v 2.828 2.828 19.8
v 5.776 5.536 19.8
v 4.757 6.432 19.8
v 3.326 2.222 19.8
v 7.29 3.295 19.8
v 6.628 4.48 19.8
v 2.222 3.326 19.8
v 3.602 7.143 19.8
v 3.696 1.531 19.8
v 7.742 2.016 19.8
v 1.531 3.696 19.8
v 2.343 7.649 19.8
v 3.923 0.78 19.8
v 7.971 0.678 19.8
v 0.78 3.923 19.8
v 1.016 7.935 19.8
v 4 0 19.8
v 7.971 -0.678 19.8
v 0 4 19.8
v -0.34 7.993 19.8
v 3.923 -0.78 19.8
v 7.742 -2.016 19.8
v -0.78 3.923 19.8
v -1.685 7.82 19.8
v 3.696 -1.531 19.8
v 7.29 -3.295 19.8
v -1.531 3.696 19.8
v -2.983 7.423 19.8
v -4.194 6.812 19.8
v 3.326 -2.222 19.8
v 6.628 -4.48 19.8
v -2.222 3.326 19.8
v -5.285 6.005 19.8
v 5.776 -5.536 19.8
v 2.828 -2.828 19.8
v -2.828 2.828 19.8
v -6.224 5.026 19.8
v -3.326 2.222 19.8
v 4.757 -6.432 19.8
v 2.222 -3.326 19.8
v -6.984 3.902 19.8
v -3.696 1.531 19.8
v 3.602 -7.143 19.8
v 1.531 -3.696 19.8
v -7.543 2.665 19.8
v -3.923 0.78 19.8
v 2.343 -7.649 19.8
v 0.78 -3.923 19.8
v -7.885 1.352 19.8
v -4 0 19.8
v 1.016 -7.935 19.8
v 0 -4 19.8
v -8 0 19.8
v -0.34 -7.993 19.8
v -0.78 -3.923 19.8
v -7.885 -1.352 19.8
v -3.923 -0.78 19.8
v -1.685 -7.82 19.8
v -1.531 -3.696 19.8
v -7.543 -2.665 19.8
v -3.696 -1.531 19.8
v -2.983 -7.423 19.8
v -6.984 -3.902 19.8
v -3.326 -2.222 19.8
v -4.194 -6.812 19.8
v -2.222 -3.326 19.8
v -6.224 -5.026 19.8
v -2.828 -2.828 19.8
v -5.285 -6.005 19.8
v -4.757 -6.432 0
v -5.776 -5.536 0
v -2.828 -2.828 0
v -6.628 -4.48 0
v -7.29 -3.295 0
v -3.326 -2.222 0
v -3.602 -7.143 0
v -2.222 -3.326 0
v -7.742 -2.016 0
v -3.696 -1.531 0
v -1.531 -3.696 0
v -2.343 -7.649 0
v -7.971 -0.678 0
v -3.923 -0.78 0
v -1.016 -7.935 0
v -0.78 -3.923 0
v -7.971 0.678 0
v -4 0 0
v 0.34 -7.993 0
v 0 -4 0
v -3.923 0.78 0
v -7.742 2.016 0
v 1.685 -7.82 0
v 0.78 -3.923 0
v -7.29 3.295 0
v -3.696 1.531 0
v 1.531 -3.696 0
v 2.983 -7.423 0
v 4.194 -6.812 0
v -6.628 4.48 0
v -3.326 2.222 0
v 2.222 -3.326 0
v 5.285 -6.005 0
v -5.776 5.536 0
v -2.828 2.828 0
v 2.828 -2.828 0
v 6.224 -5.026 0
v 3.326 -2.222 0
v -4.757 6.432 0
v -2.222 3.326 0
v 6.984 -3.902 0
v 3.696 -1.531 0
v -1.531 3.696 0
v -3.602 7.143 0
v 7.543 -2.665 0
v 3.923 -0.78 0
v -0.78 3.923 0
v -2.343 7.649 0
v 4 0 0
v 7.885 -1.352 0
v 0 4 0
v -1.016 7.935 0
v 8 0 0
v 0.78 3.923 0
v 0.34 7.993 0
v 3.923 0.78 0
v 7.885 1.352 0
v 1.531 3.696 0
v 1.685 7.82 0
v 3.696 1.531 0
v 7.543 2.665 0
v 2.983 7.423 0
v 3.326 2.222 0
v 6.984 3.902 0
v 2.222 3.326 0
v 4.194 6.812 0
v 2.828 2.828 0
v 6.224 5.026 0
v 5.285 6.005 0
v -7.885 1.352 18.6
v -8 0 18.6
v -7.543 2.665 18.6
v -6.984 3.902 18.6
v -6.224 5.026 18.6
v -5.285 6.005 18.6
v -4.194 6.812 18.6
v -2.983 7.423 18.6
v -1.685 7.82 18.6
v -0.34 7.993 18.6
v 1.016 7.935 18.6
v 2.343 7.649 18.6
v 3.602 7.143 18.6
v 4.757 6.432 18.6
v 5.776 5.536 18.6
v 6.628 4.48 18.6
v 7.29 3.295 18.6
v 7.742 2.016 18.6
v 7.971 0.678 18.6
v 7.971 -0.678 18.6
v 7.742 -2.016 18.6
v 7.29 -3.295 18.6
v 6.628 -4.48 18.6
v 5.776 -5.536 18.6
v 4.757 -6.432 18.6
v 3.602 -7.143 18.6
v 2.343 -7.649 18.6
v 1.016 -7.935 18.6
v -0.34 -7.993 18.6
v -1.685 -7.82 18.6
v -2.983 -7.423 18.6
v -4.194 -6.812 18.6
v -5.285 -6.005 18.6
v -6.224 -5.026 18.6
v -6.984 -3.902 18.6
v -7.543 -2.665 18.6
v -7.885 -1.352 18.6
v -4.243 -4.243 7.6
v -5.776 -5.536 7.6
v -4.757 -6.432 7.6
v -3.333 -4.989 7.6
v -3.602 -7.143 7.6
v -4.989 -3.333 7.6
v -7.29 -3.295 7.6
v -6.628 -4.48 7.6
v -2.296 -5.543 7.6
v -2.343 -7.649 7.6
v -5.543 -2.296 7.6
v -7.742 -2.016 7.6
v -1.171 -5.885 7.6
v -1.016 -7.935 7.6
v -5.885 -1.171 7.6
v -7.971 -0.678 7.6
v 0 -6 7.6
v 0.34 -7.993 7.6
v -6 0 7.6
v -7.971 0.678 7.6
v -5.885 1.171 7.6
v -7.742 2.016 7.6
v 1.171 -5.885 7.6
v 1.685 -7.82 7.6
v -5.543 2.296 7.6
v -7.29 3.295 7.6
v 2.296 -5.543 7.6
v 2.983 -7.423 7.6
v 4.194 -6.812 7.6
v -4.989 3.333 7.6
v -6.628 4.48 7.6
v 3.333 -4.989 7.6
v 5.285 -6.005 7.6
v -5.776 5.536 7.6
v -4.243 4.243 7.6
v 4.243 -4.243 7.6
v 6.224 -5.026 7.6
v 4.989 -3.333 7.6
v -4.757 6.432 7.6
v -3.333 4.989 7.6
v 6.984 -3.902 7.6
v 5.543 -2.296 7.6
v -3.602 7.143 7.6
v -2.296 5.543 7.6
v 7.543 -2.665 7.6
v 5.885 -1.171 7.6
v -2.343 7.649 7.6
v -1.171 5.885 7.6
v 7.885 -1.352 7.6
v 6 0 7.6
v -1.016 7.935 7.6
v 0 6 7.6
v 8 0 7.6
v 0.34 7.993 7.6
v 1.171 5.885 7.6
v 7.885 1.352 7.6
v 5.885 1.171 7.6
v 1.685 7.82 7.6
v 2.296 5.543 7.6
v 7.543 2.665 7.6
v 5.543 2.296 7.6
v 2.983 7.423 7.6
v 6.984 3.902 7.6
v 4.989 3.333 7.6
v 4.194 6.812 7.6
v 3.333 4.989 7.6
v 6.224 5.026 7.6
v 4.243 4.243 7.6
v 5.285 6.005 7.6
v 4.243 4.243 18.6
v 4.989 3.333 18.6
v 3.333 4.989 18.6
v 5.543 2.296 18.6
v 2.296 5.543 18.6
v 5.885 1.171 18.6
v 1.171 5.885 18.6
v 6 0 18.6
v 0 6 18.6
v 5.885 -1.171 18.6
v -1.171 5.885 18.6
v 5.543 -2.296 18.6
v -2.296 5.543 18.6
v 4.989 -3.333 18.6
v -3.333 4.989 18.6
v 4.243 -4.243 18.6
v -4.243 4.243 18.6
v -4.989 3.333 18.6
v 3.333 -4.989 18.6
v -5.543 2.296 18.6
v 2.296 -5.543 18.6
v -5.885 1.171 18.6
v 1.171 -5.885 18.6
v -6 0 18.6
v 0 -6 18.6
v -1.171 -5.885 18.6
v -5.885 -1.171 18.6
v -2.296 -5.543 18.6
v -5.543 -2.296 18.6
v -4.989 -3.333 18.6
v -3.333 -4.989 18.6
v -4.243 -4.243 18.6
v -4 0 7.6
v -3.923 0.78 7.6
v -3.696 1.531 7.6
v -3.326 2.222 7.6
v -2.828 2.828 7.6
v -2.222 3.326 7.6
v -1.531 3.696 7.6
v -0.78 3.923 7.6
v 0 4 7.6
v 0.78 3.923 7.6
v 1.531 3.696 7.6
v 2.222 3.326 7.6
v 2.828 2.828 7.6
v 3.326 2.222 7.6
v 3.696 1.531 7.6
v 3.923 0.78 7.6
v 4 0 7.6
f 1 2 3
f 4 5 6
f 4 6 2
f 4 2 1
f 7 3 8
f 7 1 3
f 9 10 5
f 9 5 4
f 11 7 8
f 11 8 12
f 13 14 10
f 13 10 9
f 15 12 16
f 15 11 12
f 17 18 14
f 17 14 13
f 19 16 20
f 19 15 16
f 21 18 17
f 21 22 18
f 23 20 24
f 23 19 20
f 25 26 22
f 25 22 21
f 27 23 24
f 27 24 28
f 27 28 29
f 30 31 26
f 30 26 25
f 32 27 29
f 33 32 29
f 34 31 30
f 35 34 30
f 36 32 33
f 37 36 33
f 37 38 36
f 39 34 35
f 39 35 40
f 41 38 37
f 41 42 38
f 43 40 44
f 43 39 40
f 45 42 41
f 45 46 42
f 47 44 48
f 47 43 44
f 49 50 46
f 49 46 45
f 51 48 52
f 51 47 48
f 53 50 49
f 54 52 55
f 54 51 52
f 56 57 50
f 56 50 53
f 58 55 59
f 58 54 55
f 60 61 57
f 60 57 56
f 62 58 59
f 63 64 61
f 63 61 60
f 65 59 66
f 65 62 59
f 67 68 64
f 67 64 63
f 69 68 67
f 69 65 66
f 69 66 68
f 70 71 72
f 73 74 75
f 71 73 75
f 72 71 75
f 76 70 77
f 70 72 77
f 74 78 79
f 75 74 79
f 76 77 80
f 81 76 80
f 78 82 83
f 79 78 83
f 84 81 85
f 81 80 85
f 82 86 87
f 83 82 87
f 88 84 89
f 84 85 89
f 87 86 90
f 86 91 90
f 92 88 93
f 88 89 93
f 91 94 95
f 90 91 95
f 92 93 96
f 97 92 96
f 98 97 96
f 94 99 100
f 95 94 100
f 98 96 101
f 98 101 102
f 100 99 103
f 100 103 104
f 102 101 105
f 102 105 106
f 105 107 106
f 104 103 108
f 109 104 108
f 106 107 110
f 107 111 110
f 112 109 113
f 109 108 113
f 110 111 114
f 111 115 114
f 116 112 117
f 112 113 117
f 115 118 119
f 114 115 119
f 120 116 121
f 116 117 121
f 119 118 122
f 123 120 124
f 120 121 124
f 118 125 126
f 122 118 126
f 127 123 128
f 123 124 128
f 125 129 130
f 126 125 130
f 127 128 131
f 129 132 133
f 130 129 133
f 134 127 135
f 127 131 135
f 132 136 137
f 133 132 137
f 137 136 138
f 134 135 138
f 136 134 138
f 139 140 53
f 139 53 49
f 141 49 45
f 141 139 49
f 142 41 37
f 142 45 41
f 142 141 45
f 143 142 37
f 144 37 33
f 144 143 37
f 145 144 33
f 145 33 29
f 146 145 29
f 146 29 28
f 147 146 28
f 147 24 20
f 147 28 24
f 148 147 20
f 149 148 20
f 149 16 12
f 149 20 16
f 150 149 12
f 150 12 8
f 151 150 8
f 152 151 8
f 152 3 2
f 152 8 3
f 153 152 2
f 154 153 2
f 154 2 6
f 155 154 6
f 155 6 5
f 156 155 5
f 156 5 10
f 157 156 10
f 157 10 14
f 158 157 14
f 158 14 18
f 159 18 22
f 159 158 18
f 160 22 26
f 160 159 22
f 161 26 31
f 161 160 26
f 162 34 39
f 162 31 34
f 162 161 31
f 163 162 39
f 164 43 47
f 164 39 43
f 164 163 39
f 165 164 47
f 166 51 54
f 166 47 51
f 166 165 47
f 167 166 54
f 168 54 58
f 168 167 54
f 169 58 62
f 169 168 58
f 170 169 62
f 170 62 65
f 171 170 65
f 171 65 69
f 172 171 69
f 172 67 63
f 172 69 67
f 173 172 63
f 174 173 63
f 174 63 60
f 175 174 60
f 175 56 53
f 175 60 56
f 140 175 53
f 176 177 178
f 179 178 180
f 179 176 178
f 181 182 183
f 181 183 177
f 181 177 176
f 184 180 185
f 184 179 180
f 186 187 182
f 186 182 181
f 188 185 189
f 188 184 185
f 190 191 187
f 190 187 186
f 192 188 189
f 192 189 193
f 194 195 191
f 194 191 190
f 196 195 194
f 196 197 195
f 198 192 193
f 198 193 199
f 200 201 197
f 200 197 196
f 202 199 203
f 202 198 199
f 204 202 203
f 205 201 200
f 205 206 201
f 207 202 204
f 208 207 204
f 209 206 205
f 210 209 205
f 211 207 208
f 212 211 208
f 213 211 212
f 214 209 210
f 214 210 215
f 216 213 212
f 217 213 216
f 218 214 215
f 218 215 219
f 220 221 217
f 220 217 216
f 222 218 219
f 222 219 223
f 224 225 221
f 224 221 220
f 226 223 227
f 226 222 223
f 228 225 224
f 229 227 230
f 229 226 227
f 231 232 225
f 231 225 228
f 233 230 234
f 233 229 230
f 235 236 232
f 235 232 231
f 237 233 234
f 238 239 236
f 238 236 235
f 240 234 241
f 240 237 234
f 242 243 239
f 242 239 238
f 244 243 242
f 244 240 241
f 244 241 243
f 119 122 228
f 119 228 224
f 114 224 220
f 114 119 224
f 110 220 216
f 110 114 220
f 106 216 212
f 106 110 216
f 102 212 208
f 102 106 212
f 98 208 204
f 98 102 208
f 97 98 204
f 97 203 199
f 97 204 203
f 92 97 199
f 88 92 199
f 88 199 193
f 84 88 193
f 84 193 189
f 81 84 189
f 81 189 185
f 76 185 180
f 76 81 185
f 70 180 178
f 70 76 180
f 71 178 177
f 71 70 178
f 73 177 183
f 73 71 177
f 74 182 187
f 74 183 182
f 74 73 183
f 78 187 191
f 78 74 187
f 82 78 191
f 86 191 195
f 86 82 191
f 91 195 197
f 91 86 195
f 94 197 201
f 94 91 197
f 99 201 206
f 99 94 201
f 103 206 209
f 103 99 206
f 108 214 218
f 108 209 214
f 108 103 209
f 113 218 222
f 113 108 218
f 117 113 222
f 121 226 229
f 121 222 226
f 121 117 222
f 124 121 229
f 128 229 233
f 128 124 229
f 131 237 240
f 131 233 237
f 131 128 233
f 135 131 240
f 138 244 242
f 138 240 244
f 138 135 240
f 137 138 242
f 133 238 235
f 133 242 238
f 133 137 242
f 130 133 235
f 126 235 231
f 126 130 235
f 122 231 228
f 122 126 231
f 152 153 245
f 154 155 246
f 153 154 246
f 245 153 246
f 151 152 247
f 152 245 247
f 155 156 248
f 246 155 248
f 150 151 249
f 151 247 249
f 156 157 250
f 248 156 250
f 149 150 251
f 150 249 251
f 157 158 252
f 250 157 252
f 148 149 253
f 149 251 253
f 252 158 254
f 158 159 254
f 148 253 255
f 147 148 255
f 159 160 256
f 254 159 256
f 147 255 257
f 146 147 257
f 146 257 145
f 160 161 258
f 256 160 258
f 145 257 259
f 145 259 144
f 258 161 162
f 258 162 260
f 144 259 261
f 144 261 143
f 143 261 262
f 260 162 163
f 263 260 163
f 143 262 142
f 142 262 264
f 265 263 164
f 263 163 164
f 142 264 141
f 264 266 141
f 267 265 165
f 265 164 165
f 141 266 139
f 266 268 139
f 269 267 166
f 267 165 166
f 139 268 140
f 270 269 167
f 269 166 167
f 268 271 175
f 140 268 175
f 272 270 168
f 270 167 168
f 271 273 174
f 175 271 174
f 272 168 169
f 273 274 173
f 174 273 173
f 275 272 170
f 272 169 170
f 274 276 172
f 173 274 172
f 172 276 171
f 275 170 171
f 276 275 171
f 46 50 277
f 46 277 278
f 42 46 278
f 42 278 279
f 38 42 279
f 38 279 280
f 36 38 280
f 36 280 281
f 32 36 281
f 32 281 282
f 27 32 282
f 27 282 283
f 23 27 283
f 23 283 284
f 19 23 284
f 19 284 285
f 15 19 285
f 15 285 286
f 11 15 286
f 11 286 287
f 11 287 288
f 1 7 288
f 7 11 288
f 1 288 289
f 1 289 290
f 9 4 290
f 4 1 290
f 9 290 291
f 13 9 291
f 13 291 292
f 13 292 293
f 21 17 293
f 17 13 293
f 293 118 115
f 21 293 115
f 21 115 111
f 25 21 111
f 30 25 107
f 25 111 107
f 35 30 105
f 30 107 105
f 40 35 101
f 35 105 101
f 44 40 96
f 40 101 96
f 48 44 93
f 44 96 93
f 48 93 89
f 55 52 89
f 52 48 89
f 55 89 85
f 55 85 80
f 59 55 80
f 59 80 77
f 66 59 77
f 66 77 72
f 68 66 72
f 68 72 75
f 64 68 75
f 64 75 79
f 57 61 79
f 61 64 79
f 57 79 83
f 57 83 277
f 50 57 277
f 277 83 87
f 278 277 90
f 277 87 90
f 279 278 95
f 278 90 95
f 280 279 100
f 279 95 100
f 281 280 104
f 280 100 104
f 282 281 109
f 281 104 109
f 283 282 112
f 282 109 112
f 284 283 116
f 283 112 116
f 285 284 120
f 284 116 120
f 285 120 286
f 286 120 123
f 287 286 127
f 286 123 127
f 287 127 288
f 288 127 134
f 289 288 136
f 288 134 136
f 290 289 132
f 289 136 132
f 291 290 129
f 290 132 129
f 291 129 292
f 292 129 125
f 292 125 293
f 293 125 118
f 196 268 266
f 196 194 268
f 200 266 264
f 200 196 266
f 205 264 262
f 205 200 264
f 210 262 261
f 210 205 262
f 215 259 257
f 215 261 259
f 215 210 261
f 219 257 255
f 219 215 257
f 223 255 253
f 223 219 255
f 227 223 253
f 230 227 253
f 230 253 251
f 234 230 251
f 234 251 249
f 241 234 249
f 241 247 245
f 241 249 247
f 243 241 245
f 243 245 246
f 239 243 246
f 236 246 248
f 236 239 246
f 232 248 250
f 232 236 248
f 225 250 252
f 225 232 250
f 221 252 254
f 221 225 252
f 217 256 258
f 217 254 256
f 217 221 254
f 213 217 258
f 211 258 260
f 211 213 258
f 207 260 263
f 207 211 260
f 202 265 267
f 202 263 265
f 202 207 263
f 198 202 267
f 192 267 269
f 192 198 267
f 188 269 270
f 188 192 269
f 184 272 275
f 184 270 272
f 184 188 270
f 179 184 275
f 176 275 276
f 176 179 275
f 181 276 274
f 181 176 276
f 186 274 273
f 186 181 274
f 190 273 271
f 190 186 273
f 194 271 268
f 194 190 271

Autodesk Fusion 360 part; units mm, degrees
sketch "Sketch1" plane through (0, 0, 0) normal (0, 0, 1) x (1, 0, 0)
  circle A0 centre (0, 0) radius 8
  circle A1 centre (0, 0) radius 4
  dimension "d1" = 16
  dimension "d2" = 8
extrude "Extrude1" add sketch "Sketch1" along normal blind 7.6
sketch "Sketch2" plane through (0, 0, 7.6) normal (0, 0, 1) x (-1, 0, 0)
  circle A0 centre (0, 0) radius 4
  circle A1 centre (0, 0) radius 8
  circle A2 centre (0, 0) radius 6
  dimension "d5" = 12
extrude "Extrude2" add sketch "Sketch2" along normal blind 11 contours A2
sketch "Sketch3" plane through (0, 0, 18.6) normal (0, 0, 1) x (-1, 0, 0)
  circle A0 centre (0, 0) radius 4
  circle A1 centre (0, 0) radius 6
  circle A2 centre (0, 0) radius 8
  dimension "d8" = 16
extrude "Extrude3" add sketch "Sketch3" along normal blind 1.2 contours A1 | A2
